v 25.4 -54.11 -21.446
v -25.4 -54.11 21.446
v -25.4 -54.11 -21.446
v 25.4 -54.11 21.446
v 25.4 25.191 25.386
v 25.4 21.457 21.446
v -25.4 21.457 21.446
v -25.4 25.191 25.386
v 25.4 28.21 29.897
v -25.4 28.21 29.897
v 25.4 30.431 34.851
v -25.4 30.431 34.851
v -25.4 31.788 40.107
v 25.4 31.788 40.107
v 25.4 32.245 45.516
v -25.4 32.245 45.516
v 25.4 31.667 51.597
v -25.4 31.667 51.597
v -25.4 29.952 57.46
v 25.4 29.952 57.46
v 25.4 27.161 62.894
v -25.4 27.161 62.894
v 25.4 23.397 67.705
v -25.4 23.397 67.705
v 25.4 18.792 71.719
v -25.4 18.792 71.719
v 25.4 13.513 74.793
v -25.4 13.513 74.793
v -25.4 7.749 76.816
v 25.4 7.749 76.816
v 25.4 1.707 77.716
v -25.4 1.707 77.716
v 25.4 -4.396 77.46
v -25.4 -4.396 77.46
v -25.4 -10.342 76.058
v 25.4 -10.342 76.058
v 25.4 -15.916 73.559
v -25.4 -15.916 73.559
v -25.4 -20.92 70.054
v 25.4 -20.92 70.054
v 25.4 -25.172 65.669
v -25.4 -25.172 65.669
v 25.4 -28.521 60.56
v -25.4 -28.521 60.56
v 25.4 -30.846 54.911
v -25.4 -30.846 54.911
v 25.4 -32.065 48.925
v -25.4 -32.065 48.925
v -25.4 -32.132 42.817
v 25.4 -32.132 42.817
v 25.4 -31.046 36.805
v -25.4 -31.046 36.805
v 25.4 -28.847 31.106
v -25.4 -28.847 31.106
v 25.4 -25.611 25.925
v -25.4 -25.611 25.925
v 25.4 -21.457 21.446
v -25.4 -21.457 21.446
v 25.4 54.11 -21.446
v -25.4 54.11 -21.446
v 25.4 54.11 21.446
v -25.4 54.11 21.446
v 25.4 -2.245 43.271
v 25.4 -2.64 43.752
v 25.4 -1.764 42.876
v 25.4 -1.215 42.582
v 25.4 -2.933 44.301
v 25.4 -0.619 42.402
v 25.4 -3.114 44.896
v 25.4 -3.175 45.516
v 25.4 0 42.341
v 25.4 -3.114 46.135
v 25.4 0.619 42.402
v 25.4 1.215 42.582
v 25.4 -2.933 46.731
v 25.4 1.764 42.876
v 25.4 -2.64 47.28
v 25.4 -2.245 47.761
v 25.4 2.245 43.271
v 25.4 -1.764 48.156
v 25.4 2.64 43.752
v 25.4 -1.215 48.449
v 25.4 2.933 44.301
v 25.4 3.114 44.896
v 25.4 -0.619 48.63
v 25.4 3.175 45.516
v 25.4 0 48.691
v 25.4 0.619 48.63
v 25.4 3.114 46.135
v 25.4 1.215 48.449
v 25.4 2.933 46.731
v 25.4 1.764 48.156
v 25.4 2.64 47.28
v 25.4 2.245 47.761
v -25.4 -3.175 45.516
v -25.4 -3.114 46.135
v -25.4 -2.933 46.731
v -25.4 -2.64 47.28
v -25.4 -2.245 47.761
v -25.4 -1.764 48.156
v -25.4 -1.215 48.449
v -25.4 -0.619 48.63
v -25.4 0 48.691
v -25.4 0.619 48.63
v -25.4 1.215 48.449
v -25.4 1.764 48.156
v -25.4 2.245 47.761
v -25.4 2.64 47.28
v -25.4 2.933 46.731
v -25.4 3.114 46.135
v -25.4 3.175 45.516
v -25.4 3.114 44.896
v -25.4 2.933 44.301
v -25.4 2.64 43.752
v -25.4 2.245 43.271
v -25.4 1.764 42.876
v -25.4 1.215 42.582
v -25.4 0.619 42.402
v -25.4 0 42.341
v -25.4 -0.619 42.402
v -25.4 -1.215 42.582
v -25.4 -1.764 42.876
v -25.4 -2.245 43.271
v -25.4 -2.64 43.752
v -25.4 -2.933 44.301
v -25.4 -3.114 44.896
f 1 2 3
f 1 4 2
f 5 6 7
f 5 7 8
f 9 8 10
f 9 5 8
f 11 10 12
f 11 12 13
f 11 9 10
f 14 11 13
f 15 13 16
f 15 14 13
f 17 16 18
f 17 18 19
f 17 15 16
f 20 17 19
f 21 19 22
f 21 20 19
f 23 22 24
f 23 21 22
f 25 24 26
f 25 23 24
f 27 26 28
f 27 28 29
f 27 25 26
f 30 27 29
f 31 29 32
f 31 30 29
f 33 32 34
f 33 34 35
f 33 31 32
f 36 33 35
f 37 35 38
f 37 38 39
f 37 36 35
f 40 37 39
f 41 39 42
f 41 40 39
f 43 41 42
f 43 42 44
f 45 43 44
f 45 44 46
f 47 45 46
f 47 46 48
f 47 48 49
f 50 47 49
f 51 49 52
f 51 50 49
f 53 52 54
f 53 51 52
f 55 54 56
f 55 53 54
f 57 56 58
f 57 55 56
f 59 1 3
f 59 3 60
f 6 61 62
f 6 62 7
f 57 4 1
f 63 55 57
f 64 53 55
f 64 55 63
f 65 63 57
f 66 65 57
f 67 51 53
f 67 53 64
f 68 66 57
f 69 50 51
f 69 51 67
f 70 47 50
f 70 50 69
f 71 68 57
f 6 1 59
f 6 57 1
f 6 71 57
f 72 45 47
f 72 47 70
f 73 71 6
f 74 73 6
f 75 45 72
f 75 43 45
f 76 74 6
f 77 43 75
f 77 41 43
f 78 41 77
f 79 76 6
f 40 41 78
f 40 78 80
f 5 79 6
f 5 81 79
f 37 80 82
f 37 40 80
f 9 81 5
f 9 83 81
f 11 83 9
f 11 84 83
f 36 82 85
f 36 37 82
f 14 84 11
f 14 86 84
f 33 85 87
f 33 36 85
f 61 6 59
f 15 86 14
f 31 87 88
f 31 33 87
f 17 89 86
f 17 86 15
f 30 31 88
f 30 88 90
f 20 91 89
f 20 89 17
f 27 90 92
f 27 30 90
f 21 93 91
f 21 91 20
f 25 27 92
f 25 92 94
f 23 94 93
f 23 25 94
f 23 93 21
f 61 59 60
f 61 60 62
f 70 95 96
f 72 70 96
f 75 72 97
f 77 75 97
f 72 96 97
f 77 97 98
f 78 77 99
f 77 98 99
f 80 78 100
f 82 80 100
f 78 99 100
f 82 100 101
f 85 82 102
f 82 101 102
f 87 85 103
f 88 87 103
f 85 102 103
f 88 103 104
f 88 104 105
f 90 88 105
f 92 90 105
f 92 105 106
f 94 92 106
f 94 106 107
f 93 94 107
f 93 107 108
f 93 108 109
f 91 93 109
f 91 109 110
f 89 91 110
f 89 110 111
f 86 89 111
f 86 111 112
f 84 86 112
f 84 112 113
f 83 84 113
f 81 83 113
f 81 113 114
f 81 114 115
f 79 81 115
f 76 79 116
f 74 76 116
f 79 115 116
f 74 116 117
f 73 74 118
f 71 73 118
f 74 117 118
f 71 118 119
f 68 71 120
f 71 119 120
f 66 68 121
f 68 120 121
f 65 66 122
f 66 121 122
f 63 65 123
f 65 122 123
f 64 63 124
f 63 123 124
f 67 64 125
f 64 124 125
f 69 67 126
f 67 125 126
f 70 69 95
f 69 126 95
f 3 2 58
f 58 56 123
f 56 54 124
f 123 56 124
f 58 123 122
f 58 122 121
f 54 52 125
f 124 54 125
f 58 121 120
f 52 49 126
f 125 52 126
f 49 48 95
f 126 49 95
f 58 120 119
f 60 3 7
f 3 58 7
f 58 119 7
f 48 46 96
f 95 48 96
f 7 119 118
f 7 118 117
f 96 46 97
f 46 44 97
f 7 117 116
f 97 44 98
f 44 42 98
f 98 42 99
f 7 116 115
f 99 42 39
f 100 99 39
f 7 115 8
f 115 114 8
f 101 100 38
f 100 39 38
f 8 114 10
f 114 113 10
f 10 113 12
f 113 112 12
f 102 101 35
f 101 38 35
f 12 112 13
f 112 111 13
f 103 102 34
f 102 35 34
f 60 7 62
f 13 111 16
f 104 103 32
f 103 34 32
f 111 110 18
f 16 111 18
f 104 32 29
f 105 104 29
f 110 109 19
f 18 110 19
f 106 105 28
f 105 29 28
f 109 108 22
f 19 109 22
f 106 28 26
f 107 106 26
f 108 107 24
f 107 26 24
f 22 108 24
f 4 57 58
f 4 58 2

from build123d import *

# Parameters (mm, degrees)
F1_DEPTH = 12.7
F2_DEPTH = 25.4
F4_D     = 6.35


with BuildPart() as f1:
    # F0 (on Right) → F1 (new body, symmetric)
    with BuildSketch(Plane.YZ):
        with BuildLine():
            Line((-54.1098564863, 21.4459784329), (-54.1098564863, -21.4459784329))
            Line((-54.1098564863, -21.4459784329), (54.1098564863, -21.4459784329))
            Line((54.1098564863, -21.4459784329), (54.1098564863, 21.4459784329))
            Line((54.1098564863, 21.4459784329), (21.4569509104, 21.4459784329))
            ThreePointArc((21.4569509104, 21.4459784329), (0, 13.2705383003), (-21.4569509104, 21.4459784329))
            Line((-21.4569509104, 21.4459784329), (-54.1098564863, 21.4459784329))
        make_face()
    extrude(amount=F1_DEPTH, both=True)

    # F0 (on Right) → F2 (join, symmetric)
    with BuildSketch(Plane.YZ):
        with BuildLine():
            Line((-54.1098564863, 21.4459784329), (-54.1098564863, -21.4459784329))
            Line((-54.1098564863, -21.4459784329), (54.1098564863, -21.4459784329))
            Line((54.1098564863, -21.4459784329), (54.1098564863, 21.4459784329))
            Line((54.1098564863, 21.4459784329), (21.4569509104, 21.4459784329))
            ThreePointArc((21.4569509104, 21.4459784329), (0, 13.2705383003), (-21.4569509104, 21.4459784329))
            Line((-21.4569509104, 21.4459784329), (-54.1098564863, 21.4459784329))
        make_face()
        with BuildLine():
            ThreePointArc((32.2452709079, 45.5158092082), (-13.1884855264, 74.9406515262), (-21.4569509104, 21.4459784329))
            Line((-21.4569509104, 21.4459784329), (21.4569509104, 21.4459784329))
            ThreePointArc((21.4569509104, 21.4459784329), (29.4248423181, 32.3273236818), (32.2452709079, 45.5158092082))
        make_face()
        with BuildLine():
            Line((21.4569509104, 21.4459784329), (-21.4569509104, 21.4459784329))
            ThreePointArc((-21.4569509104, 21.4459784329), (0, 13.2705383003), (21.4569509104, 21.4459784329))
        make_face()
    extrude(amount=F2_DEPTH, both=True)

    # F4 (through all)
    with Locations(Plane.YZ.offset(25.4)):
        with Locations((0, 45.5158092082)):
            Hole(F4_D / 2)


solid = f1.part
